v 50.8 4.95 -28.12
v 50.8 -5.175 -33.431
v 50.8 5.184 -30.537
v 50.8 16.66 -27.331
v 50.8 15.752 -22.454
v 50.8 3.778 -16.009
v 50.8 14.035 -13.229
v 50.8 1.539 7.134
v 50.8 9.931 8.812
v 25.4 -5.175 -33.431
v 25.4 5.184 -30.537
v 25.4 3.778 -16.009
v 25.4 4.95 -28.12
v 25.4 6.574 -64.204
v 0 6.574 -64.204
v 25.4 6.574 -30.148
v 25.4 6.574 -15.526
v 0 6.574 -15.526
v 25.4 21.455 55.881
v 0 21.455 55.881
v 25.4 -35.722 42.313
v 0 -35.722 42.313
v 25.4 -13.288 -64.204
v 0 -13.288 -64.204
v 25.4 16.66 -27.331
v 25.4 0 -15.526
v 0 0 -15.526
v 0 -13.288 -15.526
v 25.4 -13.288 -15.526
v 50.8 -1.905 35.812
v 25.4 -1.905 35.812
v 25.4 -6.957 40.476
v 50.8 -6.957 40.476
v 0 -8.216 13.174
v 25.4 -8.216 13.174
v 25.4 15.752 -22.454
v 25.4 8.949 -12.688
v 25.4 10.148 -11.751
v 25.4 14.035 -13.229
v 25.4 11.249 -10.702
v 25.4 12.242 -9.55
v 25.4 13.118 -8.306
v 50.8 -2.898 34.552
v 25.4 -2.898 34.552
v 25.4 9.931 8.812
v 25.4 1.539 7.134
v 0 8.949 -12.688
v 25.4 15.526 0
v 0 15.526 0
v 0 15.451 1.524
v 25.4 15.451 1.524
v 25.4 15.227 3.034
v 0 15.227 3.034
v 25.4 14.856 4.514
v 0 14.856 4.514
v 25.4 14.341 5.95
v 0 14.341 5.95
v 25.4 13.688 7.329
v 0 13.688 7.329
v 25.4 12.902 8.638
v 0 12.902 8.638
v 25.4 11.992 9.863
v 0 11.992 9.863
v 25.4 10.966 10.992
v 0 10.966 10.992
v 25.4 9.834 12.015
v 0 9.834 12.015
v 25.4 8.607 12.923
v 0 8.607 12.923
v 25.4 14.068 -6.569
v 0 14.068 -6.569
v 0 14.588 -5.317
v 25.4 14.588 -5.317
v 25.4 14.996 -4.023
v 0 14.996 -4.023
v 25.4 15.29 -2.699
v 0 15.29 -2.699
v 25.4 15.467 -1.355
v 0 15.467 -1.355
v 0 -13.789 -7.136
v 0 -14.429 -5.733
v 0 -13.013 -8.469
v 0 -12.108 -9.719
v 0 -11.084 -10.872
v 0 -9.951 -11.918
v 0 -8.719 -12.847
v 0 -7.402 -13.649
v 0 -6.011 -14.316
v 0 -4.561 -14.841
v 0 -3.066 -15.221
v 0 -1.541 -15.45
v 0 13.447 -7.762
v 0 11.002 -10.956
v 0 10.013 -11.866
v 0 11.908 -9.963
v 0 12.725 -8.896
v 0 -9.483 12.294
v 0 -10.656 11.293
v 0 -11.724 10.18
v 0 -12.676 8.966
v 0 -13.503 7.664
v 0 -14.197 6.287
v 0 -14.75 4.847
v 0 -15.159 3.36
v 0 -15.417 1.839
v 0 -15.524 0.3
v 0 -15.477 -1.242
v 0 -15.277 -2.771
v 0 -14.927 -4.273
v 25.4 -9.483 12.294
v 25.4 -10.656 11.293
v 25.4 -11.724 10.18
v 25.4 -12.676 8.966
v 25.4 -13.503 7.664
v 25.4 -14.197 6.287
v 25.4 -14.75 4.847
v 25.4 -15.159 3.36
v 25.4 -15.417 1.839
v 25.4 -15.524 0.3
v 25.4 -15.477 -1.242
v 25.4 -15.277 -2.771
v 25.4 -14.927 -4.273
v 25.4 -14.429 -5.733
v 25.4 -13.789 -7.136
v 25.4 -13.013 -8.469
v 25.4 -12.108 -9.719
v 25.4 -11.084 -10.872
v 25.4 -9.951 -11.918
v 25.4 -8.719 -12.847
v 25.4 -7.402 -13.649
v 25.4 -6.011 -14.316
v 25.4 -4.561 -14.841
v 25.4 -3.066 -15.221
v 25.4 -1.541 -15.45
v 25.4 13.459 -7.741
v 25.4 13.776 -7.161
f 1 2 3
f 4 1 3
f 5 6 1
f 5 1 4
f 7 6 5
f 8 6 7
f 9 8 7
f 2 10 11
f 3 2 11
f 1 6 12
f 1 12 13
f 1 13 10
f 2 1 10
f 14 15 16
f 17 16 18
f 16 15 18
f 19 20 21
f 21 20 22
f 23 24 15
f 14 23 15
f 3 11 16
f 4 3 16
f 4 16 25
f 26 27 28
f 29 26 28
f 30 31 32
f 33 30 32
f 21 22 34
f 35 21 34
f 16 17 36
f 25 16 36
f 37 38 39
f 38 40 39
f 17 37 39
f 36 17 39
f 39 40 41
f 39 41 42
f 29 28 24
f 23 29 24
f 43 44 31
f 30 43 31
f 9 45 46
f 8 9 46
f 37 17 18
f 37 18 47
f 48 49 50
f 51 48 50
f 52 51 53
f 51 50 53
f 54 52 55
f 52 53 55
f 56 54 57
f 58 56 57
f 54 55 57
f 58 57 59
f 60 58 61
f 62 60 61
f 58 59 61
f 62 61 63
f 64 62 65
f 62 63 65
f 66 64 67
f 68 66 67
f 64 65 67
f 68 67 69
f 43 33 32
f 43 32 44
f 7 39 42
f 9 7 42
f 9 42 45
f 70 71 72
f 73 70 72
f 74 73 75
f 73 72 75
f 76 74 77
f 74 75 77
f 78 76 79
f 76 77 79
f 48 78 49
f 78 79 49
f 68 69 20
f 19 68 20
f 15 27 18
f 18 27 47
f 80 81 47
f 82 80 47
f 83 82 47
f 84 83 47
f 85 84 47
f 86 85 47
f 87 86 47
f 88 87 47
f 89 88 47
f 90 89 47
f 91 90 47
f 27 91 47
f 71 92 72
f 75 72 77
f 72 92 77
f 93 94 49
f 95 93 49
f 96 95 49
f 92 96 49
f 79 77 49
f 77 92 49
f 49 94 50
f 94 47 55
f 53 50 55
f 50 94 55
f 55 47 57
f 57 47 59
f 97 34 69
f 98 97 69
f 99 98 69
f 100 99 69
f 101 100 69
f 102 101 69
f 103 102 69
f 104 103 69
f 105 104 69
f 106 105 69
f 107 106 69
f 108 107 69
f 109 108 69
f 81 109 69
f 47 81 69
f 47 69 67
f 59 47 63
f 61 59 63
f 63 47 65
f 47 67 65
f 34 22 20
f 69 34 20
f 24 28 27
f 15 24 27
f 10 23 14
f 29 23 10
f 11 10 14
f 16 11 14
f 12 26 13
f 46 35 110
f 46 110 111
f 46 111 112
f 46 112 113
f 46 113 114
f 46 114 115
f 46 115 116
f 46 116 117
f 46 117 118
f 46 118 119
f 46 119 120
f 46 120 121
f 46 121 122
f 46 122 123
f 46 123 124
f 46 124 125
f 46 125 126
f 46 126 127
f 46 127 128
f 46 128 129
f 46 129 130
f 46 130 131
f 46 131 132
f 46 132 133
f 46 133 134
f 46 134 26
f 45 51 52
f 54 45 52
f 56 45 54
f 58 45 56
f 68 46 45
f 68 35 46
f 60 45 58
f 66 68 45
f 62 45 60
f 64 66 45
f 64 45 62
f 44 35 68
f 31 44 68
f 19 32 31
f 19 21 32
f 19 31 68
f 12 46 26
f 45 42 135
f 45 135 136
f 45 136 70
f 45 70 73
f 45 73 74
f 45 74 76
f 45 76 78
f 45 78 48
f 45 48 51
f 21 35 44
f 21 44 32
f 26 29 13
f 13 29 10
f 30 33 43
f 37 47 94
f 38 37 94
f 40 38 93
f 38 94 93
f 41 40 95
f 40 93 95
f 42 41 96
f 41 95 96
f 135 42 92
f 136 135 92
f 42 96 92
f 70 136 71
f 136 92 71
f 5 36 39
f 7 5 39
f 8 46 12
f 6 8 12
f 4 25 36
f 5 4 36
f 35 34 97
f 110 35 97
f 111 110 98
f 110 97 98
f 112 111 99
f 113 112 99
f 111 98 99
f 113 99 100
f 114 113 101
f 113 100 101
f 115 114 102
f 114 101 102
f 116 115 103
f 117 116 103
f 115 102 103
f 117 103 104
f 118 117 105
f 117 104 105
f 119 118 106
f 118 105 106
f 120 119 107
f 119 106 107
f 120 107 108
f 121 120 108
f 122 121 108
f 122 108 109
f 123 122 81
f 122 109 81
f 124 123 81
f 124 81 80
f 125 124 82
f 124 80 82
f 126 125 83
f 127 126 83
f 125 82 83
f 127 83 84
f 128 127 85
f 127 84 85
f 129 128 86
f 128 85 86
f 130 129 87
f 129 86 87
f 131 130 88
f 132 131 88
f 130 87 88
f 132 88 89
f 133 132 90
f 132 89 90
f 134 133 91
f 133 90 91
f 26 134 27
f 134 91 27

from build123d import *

# Parameters (mm, degrees)
F1_DEPTH = 25.4
F3_DEPTH = 25.4


with BuildPart() as f1:
    # F0 (on Right) → F1 (new body)
    with BuildSketch(Plane.YZ):
        Polygon((-13.2883740589, -47.1408768902), (-13.2883740589, -64.2038285732), (6.5742493607, -64.2038285732), (6.5742493607, -19.7971570041), (0, -15.5264167115), (-13.2883740589, -15.5264167115), align=None)
        Polygon((0, -15.5264167115), (6.5742493607, -19.7971570041), (6.5742493607, -15.5264167115), align=None)
        with BuildLine():
            Line((0, -15.5264167115), (6.5742493607, -15.5264167115))
            Line((6.5742493607, -15.5264167115), (8.9490753187, -12.6879339074))
            ThreePointArc((8.9490753187, -12.6879339074), (4.6942234099, -14.7997933255), (0, -15.5264167115))
        make_face()
        with BuildLine():
            ThreePointArc((-8.216208845, 13.1743511459), (-14.9268228651, -4.2731224008), (0, -15.5264167115))
            ThreePointArc((0, -15.5264167115), (4.6942234099, -14.7997933255), (8.9490753187, -12.6879339074))
            Line((8.9490753187, -12.6879339074), (14.0681090783, -6.5694689939))
            ThreePointArc((14.0681090783, -6.5694689939), (15.1574559177, -3.3646910711), (15.5264167115, 0))
            ThreePointArc((15.5264167115, 0), (13.6875468883, 7.3294390017), (8.6065101962, 12.9227550523))
            Line((8.6065101962, 12.9227550523), (4.6159664635, -0.419639051))
            Line((4.6159664635, -0.419639051), (-8.216208845, 13.1743511459))
        make_face()
        with BuildLine():
            Line((14.0681090783, -6.5694689939), (8.9490753187, -12.6879339074))
            ThreePointArc((8.9490753187, -12.6879339074), (11.908257539, -9.9630827701), (14.0681090783, -6.5694689939))
        make_face()
        with BuildLine():
            Line((-35.7222311496, 42.3133387746), (-8.216208845, 13.1743511459))
            ThreePointArc((-8.216208845, 13.1743511459), (0.2321829769, 15.5246805753), (8.6065101962, 12.9227550523))
            Line((8.6065101962, 12.9227550523), (21.4547120332, 55.8807537376))
            Line((21.4547120332, 55.8807537376), (-35.7222311496, 42.3133387746))
        make_face()
        with BuildLine():
            ThreePointArc((8.6065101962, 12.9227550523), (0.2321829769, 15.5246805753), (-8.216208845, 13.1743511459))
            Line((-8.216208845, 13.1743511459), (4.6159664635, -0.419639051))
            Line((4.6159664635, -0.419639051), (8.6065101962, 12.9227550523))
        make_face()
    extrude(amount=F1_DEPTH)

    # F2 (on face) → F3 (join)
    with BuildSketch(Plane.YZ.offset(25.4)):
        Polygon((-2.8975114851, 34.5519260837), (-1.9047569793, 35.8120341569), (-6.9570055408, 40.475821833), align=None)
        Polygon((9.9313091487, 8.8122906163), (1.5386517625, 7.1337586269), (3.7782862439, -16.0091173098), (14.0347183236, -13.2288791008), align=None)
        Polygon((14.0347183236, -13.2288791008), (3.7782862439, -16.0091173098), (4.9502783877, -28.1196956248), (15.7521614301, -22.4540022549), align=None)
        Polygon((15.7521614301, -22.4540022549), (4.9502783877, -28.1196956248), (5.1841876849, -30.5367569319), (16.6601009867, -27.330934827), align=None)
        Polygon((5.1841876849, -30.5367569319), (4.9502783877, -28.1196956248), (-5.1754731685, -33.4307514131), align=None)
    extrude(amount=F3_DEPTH)


solid = f1.part
